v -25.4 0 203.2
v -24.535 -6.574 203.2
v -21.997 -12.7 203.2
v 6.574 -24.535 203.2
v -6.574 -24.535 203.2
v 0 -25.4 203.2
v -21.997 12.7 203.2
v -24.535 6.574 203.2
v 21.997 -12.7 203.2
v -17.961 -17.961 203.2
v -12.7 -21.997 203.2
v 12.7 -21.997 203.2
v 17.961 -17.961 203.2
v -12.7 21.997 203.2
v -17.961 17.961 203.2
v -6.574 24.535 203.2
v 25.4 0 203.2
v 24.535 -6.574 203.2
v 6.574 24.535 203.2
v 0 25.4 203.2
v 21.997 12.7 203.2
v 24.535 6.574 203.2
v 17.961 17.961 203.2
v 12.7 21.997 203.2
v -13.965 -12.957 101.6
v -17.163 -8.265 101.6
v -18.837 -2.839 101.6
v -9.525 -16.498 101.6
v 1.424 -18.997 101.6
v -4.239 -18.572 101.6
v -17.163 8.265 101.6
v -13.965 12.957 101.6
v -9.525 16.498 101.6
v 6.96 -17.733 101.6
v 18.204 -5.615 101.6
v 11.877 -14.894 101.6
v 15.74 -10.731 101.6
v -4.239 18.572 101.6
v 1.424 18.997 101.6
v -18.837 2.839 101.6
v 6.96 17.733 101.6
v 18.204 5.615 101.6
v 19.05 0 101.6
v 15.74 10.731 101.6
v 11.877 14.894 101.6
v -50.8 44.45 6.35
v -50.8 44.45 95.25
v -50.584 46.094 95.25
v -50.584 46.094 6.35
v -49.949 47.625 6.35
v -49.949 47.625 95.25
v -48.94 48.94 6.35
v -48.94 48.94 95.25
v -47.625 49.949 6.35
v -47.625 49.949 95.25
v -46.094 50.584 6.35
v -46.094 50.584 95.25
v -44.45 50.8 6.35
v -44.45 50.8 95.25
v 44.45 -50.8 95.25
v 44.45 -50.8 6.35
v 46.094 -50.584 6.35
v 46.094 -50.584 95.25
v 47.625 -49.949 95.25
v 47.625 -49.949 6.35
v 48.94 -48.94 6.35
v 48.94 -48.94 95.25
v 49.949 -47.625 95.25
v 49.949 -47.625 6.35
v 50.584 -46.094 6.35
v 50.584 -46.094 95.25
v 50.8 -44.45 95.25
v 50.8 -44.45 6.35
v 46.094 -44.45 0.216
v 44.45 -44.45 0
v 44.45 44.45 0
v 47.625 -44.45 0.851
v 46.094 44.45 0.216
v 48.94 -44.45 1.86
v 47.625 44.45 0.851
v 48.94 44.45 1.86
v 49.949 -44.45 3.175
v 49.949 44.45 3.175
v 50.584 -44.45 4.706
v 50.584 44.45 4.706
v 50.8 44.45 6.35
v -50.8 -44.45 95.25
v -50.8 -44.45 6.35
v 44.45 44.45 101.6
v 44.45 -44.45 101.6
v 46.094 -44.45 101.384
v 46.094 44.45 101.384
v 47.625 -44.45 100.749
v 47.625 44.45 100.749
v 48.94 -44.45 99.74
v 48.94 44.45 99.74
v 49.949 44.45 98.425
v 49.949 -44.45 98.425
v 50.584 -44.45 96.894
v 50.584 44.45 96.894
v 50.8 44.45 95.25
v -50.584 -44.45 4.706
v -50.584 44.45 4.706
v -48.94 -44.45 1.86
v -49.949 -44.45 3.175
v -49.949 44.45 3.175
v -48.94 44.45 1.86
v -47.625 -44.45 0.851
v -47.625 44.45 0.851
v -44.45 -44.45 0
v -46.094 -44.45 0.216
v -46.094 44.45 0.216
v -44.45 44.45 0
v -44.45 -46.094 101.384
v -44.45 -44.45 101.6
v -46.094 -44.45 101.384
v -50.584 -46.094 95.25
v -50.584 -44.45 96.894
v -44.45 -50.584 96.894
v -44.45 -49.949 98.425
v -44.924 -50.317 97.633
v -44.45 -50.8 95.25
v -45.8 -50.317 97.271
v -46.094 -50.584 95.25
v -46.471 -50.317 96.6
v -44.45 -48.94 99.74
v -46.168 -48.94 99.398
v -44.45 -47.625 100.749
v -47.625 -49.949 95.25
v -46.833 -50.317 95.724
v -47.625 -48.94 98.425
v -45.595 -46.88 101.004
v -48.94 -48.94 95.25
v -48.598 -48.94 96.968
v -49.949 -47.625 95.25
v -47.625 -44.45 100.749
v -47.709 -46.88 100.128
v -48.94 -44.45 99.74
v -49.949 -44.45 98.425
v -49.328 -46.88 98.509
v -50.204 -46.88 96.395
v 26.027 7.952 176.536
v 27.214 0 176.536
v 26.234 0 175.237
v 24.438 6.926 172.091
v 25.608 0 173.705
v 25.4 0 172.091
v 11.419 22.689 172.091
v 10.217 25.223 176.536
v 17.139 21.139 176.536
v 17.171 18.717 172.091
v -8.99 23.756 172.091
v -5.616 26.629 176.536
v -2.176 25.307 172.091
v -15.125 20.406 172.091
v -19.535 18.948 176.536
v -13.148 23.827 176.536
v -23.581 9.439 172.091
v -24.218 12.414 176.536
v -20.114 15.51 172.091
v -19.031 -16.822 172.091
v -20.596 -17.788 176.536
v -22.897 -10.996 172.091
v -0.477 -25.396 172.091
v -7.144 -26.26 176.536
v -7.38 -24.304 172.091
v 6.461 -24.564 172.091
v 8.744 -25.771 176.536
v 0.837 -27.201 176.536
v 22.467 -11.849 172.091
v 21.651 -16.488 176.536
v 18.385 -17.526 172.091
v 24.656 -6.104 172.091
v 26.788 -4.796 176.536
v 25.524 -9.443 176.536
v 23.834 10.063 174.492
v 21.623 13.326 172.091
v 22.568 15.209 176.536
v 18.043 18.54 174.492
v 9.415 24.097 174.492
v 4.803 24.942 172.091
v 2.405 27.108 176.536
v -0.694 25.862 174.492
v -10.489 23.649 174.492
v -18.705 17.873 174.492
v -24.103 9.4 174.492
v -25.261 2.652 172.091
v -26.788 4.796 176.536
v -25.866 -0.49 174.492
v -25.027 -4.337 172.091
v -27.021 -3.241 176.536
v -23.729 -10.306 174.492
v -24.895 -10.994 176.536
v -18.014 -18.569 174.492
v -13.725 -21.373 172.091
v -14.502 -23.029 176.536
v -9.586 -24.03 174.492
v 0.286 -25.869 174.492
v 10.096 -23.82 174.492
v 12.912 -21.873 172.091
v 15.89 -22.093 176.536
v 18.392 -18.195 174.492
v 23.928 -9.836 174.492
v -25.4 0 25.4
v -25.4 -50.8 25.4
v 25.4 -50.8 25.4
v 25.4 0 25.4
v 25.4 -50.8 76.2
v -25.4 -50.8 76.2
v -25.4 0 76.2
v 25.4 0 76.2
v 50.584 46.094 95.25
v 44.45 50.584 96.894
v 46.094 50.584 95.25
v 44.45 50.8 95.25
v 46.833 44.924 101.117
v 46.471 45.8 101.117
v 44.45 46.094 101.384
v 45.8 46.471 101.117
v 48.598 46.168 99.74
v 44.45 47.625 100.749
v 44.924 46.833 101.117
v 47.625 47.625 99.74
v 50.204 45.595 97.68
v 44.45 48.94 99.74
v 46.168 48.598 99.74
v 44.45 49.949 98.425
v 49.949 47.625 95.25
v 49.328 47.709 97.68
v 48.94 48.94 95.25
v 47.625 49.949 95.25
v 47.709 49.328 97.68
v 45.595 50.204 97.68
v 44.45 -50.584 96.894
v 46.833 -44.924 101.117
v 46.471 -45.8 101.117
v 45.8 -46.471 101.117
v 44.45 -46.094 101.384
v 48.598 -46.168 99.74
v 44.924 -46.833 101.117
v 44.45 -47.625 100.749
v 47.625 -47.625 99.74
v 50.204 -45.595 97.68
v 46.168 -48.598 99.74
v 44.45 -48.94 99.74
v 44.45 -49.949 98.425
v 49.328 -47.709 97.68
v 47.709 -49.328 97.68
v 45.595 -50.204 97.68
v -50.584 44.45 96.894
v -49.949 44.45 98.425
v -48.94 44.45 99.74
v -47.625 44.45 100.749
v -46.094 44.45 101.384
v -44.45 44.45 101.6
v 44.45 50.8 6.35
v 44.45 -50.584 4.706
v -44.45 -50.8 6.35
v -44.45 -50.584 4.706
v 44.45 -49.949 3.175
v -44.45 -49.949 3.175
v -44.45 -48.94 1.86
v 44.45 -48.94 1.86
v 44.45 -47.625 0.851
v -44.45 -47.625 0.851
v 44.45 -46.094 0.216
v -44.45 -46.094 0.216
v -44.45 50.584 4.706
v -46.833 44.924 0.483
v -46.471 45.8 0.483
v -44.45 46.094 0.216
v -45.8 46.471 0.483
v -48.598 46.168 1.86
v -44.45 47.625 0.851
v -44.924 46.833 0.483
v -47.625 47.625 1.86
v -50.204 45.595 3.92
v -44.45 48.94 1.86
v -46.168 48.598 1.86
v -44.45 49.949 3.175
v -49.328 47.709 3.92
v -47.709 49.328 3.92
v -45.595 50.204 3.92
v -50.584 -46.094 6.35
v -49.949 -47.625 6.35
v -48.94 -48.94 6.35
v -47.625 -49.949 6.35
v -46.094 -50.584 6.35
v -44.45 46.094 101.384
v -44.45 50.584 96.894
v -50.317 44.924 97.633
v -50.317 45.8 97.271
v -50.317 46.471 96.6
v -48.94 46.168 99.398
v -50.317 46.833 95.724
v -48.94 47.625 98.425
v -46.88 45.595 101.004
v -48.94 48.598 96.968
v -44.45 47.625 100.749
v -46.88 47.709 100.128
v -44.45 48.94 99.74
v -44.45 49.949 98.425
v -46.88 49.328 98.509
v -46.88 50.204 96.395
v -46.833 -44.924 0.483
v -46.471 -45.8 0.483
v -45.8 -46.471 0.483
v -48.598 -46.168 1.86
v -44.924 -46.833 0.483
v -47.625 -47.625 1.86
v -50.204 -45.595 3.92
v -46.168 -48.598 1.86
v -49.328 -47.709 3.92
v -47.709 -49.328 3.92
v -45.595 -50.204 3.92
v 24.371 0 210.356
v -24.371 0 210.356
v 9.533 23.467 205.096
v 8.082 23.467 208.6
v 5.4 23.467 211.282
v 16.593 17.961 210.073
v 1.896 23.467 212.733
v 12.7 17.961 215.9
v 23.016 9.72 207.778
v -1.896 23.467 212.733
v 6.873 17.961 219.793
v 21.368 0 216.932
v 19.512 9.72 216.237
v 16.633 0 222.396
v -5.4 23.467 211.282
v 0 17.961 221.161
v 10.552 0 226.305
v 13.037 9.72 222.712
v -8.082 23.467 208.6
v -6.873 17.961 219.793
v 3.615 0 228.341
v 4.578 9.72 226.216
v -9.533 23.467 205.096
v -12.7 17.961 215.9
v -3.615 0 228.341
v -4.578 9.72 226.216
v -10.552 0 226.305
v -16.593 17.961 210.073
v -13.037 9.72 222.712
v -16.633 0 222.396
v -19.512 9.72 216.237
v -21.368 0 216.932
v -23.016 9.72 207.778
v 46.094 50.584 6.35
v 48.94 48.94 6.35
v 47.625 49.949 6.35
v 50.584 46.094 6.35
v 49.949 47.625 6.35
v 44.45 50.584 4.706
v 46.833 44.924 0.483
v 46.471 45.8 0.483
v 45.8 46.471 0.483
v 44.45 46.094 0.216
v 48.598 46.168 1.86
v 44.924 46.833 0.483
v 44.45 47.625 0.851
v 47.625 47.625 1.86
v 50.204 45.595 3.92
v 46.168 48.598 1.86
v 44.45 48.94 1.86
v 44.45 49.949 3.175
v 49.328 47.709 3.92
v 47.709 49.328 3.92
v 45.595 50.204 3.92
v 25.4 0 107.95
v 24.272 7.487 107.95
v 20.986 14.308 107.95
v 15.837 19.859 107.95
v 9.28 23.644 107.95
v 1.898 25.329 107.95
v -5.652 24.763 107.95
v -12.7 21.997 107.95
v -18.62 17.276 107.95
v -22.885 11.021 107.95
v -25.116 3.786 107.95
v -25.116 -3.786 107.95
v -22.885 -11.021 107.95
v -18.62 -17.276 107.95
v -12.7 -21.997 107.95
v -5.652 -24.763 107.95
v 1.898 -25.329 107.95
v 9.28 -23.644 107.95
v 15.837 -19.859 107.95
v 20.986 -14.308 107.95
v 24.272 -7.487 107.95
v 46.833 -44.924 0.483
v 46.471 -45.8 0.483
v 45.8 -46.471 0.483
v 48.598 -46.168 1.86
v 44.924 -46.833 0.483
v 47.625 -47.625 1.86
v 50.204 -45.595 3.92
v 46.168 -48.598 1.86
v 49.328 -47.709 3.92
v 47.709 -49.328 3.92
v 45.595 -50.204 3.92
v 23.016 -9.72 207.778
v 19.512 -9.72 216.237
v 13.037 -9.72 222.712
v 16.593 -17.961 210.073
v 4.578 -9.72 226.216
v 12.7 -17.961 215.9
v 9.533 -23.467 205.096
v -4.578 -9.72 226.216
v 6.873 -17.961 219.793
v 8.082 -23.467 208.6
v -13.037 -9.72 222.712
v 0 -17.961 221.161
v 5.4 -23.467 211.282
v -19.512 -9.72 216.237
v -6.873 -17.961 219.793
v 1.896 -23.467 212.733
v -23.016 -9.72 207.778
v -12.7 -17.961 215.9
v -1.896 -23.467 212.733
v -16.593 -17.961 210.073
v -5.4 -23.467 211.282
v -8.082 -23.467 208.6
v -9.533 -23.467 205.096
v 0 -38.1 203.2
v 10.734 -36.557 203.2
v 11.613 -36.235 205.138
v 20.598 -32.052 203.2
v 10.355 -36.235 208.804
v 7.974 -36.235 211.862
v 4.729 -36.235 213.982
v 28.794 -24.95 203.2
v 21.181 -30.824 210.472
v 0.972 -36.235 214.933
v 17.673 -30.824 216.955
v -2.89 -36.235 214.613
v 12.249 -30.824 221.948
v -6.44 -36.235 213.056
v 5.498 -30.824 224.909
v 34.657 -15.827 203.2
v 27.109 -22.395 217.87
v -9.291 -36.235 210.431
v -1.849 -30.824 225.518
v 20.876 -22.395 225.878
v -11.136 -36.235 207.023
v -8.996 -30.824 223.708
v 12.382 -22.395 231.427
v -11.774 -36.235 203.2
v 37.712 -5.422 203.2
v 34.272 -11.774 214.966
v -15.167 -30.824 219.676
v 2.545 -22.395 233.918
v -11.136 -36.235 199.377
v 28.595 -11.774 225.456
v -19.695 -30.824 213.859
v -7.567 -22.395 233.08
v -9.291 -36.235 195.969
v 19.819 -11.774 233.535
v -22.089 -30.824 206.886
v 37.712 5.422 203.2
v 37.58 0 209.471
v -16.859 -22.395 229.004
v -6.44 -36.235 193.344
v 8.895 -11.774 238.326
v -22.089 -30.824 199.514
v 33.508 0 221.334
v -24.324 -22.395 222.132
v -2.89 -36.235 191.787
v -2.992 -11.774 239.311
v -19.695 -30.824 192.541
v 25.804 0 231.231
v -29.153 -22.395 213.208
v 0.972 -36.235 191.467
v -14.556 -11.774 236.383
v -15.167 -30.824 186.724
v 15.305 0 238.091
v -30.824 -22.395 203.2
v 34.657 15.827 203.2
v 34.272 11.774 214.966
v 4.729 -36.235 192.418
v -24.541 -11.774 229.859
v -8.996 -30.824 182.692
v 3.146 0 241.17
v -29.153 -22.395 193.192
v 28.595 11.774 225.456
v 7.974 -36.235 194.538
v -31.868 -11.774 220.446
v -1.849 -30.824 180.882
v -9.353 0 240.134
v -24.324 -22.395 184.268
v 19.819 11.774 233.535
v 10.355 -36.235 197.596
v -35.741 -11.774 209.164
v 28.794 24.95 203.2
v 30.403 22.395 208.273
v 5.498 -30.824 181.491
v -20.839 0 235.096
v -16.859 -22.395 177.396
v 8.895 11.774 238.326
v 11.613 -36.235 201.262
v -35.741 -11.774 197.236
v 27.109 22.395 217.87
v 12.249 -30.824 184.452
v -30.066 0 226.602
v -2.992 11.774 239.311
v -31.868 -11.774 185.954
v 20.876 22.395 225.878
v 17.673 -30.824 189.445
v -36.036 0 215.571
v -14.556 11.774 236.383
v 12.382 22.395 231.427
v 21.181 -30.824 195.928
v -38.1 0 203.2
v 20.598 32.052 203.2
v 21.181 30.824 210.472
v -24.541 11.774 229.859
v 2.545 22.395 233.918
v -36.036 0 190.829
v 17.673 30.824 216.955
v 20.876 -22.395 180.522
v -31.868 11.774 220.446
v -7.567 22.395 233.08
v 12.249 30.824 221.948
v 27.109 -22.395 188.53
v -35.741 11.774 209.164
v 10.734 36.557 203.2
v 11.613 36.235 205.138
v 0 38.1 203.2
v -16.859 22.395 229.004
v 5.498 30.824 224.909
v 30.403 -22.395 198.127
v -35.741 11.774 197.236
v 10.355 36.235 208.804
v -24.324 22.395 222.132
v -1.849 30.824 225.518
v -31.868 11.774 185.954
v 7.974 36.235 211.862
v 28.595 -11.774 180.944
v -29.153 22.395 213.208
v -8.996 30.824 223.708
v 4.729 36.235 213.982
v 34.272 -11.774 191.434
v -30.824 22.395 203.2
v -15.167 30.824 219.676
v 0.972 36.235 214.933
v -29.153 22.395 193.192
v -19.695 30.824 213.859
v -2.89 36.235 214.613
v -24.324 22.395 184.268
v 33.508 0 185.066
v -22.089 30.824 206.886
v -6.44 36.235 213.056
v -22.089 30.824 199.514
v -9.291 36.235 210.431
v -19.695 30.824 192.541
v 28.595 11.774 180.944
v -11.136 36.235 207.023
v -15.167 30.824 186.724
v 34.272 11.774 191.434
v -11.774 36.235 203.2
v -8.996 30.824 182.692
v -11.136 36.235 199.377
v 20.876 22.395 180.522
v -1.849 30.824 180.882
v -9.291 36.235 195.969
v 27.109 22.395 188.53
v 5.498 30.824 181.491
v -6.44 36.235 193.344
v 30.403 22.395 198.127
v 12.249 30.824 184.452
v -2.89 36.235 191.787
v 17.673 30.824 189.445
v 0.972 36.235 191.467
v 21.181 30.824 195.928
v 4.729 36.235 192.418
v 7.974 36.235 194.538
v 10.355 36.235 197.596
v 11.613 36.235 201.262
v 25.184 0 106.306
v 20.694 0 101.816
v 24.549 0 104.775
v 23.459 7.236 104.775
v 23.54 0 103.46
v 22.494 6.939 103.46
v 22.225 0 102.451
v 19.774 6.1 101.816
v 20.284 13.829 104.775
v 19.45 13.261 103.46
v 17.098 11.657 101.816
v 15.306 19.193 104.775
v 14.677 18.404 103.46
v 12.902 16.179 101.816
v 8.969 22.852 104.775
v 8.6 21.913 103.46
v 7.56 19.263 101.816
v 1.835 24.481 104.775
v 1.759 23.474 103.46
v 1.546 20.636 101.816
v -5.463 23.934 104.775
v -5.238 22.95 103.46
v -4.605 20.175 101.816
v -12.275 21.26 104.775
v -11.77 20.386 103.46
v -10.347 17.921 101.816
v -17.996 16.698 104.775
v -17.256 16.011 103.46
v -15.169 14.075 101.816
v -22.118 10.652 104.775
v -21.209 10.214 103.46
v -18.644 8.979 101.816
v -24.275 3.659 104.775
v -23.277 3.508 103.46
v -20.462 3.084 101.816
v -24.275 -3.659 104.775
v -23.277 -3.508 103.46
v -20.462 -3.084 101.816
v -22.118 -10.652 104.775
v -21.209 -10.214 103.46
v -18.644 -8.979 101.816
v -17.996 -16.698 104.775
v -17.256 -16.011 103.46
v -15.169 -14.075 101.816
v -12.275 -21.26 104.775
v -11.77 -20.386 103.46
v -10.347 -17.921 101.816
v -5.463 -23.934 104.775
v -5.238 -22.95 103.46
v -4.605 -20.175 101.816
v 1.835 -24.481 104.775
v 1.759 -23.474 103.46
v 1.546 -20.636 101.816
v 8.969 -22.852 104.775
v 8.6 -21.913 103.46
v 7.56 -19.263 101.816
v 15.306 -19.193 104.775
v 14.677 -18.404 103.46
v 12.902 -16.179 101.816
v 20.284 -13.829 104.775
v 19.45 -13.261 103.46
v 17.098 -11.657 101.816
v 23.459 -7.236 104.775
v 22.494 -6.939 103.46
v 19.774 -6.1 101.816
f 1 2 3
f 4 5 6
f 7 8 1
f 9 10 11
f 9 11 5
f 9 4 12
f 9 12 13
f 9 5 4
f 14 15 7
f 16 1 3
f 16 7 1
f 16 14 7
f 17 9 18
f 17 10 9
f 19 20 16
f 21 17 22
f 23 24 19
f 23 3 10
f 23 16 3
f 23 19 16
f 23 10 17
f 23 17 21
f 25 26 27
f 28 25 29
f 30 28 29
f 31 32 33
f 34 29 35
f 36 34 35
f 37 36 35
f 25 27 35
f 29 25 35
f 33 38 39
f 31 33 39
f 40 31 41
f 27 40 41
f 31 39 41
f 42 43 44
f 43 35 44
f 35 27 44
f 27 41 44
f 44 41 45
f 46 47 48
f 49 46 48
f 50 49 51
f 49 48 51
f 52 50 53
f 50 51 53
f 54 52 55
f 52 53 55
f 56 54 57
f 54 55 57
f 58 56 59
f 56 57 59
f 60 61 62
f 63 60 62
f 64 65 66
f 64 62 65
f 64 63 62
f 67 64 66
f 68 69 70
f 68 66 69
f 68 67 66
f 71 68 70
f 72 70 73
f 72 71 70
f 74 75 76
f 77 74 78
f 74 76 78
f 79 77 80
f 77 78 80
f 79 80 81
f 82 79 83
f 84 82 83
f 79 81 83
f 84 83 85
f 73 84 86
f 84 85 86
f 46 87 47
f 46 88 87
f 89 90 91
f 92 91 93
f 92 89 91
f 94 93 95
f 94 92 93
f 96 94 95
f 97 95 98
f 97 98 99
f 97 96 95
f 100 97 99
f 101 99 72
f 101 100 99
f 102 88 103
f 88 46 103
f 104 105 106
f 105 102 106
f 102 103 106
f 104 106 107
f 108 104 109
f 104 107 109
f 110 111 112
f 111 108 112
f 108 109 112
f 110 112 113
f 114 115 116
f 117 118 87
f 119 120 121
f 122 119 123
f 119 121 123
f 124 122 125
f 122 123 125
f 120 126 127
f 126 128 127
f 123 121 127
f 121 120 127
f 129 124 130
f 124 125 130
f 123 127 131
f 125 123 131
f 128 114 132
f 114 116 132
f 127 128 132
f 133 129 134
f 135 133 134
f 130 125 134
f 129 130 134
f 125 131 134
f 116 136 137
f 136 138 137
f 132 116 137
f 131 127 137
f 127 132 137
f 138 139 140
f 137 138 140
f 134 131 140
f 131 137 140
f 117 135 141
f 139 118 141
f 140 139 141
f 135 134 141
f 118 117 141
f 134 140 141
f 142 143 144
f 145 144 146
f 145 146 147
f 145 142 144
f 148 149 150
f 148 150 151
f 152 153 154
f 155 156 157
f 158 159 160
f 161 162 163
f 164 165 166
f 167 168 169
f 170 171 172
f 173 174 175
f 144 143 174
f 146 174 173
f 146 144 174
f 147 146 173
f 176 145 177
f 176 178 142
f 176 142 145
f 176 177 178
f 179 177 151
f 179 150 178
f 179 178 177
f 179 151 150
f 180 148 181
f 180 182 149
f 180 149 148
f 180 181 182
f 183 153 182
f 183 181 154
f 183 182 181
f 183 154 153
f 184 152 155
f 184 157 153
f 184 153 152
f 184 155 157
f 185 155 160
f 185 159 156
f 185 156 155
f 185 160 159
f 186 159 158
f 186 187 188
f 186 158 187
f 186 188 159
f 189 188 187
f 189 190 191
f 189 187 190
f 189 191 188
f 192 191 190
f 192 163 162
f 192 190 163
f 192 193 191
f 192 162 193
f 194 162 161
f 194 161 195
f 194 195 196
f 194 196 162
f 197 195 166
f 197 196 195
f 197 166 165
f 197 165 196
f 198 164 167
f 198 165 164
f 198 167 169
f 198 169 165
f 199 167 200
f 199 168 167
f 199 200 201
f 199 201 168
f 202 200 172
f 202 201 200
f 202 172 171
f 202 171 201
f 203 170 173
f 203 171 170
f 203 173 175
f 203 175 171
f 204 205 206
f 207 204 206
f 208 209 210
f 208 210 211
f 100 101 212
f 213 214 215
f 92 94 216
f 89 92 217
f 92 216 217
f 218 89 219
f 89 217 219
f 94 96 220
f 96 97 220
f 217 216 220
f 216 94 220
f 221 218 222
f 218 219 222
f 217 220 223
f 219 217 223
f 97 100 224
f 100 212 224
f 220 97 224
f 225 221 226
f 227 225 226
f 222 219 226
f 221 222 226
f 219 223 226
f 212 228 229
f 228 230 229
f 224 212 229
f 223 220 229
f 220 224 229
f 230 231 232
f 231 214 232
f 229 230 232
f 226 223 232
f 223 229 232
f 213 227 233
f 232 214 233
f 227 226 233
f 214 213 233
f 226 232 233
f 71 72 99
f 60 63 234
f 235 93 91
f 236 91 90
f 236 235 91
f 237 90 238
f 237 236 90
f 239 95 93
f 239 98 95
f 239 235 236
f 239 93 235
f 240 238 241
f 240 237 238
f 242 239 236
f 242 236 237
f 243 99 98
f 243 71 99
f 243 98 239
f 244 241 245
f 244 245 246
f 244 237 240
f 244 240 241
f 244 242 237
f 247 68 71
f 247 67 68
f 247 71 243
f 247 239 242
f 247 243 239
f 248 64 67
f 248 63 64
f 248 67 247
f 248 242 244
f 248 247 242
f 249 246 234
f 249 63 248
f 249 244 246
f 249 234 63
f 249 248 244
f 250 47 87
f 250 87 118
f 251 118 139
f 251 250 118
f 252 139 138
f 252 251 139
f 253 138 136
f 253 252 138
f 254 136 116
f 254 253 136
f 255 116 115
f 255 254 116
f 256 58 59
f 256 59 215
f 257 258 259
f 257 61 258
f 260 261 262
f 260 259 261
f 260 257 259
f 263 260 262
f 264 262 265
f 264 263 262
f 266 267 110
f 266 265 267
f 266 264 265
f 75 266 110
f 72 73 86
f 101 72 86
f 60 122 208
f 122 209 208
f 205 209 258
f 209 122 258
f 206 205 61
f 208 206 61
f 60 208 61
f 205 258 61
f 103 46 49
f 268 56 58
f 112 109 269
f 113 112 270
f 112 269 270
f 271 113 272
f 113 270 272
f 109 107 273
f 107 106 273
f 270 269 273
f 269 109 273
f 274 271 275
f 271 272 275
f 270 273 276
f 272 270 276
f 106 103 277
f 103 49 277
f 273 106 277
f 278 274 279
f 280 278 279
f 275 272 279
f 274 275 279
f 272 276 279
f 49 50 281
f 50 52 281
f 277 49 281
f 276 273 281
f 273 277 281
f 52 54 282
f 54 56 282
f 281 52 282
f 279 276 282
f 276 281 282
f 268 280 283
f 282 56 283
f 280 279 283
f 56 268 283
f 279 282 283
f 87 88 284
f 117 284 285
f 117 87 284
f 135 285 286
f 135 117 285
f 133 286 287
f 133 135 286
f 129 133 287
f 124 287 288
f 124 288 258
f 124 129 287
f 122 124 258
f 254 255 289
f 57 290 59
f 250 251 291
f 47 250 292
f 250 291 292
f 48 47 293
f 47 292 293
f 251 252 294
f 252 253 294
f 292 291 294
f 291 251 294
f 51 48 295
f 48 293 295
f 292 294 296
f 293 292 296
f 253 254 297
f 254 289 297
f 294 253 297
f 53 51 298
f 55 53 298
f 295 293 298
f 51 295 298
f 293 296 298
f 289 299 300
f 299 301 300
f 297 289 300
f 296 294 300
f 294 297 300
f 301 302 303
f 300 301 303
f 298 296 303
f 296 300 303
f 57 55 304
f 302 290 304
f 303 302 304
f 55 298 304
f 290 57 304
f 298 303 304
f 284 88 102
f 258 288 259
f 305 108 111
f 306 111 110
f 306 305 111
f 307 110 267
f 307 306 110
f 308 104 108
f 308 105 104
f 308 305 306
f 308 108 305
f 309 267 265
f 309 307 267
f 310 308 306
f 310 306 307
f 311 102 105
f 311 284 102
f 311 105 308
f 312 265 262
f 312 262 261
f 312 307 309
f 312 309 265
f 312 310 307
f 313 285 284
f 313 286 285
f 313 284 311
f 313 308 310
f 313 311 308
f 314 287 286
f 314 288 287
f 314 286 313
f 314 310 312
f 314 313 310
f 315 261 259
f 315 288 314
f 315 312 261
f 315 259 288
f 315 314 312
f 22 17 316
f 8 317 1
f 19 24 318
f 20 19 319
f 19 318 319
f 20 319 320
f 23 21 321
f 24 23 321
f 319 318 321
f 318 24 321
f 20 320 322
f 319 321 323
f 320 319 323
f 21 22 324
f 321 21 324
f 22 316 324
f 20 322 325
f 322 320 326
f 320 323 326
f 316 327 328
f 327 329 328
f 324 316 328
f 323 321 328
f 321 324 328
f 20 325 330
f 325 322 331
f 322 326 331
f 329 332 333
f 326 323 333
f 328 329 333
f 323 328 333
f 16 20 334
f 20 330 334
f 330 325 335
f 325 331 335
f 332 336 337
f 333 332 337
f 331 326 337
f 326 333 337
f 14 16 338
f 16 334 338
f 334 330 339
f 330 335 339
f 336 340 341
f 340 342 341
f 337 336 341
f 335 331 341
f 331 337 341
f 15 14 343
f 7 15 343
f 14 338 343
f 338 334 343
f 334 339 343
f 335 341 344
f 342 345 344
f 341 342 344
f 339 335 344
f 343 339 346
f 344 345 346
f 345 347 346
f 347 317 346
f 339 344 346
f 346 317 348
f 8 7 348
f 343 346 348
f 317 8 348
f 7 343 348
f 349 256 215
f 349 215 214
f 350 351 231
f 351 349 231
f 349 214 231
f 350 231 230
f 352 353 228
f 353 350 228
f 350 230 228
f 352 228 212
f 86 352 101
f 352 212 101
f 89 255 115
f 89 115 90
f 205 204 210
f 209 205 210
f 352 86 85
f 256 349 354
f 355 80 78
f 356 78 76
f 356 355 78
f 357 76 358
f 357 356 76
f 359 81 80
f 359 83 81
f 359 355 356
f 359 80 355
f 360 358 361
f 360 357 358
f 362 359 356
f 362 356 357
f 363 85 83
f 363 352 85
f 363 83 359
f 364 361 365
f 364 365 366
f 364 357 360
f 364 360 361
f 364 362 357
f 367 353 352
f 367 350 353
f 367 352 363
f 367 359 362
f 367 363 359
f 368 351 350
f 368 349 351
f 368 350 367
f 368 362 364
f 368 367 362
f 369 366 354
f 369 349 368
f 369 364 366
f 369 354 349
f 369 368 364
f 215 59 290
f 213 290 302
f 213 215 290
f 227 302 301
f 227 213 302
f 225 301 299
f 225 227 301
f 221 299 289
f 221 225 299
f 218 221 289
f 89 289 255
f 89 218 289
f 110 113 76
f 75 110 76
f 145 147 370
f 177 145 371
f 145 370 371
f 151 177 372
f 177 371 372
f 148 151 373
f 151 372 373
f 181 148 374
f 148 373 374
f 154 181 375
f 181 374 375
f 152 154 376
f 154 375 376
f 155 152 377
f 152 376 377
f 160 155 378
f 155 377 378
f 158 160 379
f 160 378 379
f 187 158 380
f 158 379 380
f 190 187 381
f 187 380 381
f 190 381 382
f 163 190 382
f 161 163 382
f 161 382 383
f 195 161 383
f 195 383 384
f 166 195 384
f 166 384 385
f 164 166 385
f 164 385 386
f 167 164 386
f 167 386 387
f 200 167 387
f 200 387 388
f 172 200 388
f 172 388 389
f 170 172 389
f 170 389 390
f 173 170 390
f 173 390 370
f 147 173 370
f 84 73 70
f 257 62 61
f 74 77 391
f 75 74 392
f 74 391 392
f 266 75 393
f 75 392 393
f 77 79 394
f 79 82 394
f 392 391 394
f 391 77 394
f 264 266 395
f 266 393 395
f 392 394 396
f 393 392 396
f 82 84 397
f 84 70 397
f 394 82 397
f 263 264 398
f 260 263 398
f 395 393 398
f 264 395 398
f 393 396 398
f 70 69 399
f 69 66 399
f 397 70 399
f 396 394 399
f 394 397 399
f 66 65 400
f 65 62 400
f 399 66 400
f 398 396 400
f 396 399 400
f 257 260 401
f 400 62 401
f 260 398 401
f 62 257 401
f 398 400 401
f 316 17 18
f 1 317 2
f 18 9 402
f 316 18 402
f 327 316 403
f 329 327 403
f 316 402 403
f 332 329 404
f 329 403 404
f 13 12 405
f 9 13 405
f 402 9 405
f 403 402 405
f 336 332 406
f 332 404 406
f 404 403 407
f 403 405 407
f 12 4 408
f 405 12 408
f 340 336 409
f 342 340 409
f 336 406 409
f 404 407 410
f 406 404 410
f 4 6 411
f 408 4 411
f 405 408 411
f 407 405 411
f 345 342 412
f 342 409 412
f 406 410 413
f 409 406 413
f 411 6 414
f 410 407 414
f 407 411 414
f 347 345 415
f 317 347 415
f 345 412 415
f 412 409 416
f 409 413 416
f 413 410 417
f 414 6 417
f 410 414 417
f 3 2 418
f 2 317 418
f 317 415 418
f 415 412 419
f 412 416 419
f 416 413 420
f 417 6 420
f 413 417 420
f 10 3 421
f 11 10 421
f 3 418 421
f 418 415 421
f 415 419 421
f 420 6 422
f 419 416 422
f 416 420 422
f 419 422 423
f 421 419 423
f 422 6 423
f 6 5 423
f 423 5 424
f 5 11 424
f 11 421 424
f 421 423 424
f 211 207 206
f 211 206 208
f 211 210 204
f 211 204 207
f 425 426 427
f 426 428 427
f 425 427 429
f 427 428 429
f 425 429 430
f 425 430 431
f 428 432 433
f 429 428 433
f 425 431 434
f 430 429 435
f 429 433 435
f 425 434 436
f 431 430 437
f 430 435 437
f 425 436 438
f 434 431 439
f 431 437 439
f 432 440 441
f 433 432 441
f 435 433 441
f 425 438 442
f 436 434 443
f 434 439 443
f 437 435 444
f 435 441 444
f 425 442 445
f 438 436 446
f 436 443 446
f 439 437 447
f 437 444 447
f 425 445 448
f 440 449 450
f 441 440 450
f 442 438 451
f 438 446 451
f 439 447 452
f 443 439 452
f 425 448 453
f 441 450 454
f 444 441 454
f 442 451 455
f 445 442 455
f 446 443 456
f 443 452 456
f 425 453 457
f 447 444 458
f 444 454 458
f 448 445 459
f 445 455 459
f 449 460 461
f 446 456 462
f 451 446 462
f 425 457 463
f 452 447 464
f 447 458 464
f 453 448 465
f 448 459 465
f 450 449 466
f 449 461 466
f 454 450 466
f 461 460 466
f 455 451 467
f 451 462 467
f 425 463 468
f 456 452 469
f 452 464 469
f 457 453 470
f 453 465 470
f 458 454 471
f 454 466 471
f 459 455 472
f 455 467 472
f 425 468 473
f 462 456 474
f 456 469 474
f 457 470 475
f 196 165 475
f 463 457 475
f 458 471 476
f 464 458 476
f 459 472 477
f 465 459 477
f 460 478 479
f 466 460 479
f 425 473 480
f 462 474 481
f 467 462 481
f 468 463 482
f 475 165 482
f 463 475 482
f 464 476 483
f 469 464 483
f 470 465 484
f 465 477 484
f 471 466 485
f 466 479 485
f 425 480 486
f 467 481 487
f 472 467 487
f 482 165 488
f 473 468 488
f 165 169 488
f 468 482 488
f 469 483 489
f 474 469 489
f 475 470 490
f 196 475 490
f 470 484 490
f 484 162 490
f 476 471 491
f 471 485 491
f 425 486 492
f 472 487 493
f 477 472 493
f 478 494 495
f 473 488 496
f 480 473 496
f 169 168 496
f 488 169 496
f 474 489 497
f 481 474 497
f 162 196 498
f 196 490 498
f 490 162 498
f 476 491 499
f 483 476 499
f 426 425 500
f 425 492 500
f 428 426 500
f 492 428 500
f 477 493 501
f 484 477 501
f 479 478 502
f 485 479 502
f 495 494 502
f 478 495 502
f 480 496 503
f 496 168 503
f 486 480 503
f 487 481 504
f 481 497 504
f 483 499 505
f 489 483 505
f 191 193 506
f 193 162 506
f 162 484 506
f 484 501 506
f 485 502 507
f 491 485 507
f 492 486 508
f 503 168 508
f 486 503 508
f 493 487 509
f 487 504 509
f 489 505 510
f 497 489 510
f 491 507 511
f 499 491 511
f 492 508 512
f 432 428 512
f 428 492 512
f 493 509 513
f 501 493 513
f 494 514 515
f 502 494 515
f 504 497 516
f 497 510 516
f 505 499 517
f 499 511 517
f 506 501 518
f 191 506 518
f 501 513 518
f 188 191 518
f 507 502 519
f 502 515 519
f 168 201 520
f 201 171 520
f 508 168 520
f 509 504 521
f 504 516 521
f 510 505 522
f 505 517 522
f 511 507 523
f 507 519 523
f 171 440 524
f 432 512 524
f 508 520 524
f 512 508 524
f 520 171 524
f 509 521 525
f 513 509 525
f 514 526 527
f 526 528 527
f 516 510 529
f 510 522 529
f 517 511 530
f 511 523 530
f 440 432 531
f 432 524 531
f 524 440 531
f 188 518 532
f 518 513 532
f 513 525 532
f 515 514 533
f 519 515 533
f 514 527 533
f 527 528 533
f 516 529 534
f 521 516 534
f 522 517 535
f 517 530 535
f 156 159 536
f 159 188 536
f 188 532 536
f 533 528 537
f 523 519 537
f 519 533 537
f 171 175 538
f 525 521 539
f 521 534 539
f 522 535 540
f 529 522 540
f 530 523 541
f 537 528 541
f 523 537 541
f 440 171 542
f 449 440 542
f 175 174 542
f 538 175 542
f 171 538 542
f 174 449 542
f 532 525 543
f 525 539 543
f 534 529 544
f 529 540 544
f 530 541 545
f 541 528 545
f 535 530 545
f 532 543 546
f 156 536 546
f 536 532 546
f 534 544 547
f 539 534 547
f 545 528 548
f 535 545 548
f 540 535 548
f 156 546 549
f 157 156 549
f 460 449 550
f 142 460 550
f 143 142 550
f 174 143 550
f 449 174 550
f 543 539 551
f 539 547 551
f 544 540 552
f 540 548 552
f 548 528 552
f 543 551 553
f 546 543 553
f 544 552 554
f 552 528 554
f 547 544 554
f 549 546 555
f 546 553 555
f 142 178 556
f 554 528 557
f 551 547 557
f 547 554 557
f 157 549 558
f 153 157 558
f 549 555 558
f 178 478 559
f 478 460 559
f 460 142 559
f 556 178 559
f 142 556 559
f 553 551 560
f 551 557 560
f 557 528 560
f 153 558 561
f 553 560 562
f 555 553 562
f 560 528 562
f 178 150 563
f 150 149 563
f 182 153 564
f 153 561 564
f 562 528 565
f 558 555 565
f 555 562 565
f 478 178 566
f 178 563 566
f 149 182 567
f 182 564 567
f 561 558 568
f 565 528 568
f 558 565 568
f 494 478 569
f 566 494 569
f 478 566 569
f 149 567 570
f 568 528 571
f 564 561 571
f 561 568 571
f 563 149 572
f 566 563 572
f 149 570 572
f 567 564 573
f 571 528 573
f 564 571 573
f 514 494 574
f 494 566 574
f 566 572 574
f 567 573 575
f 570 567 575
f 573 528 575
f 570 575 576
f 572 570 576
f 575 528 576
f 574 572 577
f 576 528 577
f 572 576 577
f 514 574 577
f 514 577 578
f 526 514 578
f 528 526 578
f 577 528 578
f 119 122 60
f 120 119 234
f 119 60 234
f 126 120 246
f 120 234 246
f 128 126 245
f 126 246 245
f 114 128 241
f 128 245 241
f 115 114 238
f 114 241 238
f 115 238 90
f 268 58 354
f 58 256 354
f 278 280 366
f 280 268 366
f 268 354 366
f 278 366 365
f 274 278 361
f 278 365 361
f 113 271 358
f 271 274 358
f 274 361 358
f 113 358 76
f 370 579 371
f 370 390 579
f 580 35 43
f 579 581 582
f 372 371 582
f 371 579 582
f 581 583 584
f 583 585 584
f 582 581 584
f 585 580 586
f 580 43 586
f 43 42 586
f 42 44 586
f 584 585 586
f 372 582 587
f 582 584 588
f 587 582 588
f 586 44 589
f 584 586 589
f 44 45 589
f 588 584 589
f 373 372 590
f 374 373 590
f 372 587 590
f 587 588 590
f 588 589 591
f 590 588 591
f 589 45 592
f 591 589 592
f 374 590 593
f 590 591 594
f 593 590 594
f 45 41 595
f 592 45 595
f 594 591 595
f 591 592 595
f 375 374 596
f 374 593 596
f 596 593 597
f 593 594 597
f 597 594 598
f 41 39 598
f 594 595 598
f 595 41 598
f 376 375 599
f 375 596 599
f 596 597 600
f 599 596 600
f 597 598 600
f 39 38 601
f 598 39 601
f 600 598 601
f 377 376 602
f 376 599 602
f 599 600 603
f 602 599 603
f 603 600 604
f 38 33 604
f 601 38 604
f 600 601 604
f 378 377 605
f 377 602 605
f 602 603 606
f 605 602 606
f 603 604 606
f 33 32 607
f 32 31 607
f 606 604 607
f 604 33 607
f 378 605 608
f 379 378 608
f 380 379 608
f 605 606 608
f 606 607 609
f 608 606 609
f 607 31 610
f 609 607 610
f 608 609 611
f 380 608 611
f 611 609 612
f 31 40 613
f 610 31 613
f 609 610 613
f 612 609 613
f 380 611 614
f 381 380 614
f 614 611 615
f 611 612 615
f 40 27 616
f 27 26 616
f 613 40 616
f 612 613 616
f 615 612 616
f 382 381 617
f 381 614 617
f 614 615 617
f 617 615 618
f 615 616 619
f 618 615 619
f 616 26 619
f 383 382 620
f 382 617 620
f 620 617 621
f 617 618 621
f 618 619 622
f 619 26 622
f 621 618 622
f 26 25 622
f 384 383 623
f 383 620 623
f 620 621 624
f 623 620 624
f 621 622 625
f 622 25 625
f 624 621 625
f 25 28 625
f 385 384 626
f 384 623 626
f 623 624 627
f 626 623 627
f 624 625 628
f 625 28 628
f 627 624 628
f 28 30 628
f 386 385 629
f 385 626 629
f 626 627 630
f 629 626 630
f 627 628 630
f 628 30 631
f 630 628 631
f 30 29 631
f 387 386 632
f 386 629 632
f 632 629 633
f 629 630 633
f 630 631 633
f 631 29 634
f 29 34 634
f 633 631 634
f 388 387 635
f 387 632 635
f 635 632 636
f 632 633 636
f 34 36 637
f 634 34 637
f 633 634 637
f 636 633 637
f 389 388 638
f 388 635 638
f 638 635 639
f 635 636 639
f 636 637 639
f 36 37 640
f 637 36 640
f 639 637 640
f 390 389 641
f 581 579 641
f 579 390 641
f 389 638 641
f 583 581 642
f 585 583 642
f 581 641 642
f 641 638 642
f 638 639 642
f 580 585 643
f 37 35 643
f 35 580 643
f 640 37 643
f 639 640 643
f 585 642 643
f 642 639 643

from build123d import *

# Parameters (mm, degrees)
F0_W     = 101.6
F0_H     = 101.6
F1_DEPTH = 101.6
F2_R     = 25.4
F3_DEPTH = 101.6
F6_W     = 50.8
F6_H     = 50.8
F7_DEPTH = 50.8
F8_R     = 6.35
F8_2_R   = 6.35


with BuildPart() as f1:
    # F0 (on Top) → F1 (new body)
    with BuildSketch(Plane.XY):
        Rectangle(F0_W, F0_H)
    extrude(amount=F1_DEPTH)

    # F6 (on face) → F7 (cut)
    with BuildSketch(Plane.XZ.offset(50.8)):
        with Locations((0, 50.8)):
            Rectangle(F6_W, F6_H)
    extrude(amount=-F7_DEPTH, mode=Mode.SUBTRACT)

    # F8
    f8_edges = [f1.edges().sort_by_distance(p)[0] for p in [
        (50.8, -50.8, 50.8),
        (50.8, 50.8, 50.8),
        (50.8, 0, 0),
        (50.8, 0, 101.6),
        (0, 50.8, 101.6),
        (-50.8, 0, 101.6),
        (0, -50.8, 101.6),
        (-50.8, 50.8, 50.8),
        (-50.8, -50.8, 50.8),
        (-50.8, 0, 0),
        (0, 50.8, 0),
        (0, -50.8, 0),
    ]]
    fillet(f8_edges, radius=F8_R)


with BuildPart() as f3:
    # F2 (on face) → F3 (new body)
    with BuildSketch(Plane.XY.offset(101.6)):
        Circle(F2_R)
    extrude(amount=F3_DEPTH)

    # F4 (on face) → F5 (revolve)
    with BuildSketch(Plane.XY.offset(203.2)):
        with BuildLine():
            Line((0, -25.4), (0, -38.1))
            ThreePointArc((0, -38.1), (38.1, 0), (0, 38.1))
            Line((0, 38.1), (0, 25.4))
            ThreePointArc((0, 25.4), (17.9605122421, 17.9605122421), (25.4, 0))
            ThreePointArc((25.4, 0), (17.9605122421, -17.9605122421), (0, -25.4))
        make_face()
    revolve(axis=Axis((0, 0, 203.2), (0, -1, 0)))

    # F8#2
    f8_2_edges = [f3.edges().sort_by_distance(p)[0] for p in [
        (-25.4, 0, 101.6),
        (-25.4, 0, 174.801937),
    ]]
    fillet(f8_2_edges, radius=F8_2_R)


solid = Compound([f1.part, f3.part])
